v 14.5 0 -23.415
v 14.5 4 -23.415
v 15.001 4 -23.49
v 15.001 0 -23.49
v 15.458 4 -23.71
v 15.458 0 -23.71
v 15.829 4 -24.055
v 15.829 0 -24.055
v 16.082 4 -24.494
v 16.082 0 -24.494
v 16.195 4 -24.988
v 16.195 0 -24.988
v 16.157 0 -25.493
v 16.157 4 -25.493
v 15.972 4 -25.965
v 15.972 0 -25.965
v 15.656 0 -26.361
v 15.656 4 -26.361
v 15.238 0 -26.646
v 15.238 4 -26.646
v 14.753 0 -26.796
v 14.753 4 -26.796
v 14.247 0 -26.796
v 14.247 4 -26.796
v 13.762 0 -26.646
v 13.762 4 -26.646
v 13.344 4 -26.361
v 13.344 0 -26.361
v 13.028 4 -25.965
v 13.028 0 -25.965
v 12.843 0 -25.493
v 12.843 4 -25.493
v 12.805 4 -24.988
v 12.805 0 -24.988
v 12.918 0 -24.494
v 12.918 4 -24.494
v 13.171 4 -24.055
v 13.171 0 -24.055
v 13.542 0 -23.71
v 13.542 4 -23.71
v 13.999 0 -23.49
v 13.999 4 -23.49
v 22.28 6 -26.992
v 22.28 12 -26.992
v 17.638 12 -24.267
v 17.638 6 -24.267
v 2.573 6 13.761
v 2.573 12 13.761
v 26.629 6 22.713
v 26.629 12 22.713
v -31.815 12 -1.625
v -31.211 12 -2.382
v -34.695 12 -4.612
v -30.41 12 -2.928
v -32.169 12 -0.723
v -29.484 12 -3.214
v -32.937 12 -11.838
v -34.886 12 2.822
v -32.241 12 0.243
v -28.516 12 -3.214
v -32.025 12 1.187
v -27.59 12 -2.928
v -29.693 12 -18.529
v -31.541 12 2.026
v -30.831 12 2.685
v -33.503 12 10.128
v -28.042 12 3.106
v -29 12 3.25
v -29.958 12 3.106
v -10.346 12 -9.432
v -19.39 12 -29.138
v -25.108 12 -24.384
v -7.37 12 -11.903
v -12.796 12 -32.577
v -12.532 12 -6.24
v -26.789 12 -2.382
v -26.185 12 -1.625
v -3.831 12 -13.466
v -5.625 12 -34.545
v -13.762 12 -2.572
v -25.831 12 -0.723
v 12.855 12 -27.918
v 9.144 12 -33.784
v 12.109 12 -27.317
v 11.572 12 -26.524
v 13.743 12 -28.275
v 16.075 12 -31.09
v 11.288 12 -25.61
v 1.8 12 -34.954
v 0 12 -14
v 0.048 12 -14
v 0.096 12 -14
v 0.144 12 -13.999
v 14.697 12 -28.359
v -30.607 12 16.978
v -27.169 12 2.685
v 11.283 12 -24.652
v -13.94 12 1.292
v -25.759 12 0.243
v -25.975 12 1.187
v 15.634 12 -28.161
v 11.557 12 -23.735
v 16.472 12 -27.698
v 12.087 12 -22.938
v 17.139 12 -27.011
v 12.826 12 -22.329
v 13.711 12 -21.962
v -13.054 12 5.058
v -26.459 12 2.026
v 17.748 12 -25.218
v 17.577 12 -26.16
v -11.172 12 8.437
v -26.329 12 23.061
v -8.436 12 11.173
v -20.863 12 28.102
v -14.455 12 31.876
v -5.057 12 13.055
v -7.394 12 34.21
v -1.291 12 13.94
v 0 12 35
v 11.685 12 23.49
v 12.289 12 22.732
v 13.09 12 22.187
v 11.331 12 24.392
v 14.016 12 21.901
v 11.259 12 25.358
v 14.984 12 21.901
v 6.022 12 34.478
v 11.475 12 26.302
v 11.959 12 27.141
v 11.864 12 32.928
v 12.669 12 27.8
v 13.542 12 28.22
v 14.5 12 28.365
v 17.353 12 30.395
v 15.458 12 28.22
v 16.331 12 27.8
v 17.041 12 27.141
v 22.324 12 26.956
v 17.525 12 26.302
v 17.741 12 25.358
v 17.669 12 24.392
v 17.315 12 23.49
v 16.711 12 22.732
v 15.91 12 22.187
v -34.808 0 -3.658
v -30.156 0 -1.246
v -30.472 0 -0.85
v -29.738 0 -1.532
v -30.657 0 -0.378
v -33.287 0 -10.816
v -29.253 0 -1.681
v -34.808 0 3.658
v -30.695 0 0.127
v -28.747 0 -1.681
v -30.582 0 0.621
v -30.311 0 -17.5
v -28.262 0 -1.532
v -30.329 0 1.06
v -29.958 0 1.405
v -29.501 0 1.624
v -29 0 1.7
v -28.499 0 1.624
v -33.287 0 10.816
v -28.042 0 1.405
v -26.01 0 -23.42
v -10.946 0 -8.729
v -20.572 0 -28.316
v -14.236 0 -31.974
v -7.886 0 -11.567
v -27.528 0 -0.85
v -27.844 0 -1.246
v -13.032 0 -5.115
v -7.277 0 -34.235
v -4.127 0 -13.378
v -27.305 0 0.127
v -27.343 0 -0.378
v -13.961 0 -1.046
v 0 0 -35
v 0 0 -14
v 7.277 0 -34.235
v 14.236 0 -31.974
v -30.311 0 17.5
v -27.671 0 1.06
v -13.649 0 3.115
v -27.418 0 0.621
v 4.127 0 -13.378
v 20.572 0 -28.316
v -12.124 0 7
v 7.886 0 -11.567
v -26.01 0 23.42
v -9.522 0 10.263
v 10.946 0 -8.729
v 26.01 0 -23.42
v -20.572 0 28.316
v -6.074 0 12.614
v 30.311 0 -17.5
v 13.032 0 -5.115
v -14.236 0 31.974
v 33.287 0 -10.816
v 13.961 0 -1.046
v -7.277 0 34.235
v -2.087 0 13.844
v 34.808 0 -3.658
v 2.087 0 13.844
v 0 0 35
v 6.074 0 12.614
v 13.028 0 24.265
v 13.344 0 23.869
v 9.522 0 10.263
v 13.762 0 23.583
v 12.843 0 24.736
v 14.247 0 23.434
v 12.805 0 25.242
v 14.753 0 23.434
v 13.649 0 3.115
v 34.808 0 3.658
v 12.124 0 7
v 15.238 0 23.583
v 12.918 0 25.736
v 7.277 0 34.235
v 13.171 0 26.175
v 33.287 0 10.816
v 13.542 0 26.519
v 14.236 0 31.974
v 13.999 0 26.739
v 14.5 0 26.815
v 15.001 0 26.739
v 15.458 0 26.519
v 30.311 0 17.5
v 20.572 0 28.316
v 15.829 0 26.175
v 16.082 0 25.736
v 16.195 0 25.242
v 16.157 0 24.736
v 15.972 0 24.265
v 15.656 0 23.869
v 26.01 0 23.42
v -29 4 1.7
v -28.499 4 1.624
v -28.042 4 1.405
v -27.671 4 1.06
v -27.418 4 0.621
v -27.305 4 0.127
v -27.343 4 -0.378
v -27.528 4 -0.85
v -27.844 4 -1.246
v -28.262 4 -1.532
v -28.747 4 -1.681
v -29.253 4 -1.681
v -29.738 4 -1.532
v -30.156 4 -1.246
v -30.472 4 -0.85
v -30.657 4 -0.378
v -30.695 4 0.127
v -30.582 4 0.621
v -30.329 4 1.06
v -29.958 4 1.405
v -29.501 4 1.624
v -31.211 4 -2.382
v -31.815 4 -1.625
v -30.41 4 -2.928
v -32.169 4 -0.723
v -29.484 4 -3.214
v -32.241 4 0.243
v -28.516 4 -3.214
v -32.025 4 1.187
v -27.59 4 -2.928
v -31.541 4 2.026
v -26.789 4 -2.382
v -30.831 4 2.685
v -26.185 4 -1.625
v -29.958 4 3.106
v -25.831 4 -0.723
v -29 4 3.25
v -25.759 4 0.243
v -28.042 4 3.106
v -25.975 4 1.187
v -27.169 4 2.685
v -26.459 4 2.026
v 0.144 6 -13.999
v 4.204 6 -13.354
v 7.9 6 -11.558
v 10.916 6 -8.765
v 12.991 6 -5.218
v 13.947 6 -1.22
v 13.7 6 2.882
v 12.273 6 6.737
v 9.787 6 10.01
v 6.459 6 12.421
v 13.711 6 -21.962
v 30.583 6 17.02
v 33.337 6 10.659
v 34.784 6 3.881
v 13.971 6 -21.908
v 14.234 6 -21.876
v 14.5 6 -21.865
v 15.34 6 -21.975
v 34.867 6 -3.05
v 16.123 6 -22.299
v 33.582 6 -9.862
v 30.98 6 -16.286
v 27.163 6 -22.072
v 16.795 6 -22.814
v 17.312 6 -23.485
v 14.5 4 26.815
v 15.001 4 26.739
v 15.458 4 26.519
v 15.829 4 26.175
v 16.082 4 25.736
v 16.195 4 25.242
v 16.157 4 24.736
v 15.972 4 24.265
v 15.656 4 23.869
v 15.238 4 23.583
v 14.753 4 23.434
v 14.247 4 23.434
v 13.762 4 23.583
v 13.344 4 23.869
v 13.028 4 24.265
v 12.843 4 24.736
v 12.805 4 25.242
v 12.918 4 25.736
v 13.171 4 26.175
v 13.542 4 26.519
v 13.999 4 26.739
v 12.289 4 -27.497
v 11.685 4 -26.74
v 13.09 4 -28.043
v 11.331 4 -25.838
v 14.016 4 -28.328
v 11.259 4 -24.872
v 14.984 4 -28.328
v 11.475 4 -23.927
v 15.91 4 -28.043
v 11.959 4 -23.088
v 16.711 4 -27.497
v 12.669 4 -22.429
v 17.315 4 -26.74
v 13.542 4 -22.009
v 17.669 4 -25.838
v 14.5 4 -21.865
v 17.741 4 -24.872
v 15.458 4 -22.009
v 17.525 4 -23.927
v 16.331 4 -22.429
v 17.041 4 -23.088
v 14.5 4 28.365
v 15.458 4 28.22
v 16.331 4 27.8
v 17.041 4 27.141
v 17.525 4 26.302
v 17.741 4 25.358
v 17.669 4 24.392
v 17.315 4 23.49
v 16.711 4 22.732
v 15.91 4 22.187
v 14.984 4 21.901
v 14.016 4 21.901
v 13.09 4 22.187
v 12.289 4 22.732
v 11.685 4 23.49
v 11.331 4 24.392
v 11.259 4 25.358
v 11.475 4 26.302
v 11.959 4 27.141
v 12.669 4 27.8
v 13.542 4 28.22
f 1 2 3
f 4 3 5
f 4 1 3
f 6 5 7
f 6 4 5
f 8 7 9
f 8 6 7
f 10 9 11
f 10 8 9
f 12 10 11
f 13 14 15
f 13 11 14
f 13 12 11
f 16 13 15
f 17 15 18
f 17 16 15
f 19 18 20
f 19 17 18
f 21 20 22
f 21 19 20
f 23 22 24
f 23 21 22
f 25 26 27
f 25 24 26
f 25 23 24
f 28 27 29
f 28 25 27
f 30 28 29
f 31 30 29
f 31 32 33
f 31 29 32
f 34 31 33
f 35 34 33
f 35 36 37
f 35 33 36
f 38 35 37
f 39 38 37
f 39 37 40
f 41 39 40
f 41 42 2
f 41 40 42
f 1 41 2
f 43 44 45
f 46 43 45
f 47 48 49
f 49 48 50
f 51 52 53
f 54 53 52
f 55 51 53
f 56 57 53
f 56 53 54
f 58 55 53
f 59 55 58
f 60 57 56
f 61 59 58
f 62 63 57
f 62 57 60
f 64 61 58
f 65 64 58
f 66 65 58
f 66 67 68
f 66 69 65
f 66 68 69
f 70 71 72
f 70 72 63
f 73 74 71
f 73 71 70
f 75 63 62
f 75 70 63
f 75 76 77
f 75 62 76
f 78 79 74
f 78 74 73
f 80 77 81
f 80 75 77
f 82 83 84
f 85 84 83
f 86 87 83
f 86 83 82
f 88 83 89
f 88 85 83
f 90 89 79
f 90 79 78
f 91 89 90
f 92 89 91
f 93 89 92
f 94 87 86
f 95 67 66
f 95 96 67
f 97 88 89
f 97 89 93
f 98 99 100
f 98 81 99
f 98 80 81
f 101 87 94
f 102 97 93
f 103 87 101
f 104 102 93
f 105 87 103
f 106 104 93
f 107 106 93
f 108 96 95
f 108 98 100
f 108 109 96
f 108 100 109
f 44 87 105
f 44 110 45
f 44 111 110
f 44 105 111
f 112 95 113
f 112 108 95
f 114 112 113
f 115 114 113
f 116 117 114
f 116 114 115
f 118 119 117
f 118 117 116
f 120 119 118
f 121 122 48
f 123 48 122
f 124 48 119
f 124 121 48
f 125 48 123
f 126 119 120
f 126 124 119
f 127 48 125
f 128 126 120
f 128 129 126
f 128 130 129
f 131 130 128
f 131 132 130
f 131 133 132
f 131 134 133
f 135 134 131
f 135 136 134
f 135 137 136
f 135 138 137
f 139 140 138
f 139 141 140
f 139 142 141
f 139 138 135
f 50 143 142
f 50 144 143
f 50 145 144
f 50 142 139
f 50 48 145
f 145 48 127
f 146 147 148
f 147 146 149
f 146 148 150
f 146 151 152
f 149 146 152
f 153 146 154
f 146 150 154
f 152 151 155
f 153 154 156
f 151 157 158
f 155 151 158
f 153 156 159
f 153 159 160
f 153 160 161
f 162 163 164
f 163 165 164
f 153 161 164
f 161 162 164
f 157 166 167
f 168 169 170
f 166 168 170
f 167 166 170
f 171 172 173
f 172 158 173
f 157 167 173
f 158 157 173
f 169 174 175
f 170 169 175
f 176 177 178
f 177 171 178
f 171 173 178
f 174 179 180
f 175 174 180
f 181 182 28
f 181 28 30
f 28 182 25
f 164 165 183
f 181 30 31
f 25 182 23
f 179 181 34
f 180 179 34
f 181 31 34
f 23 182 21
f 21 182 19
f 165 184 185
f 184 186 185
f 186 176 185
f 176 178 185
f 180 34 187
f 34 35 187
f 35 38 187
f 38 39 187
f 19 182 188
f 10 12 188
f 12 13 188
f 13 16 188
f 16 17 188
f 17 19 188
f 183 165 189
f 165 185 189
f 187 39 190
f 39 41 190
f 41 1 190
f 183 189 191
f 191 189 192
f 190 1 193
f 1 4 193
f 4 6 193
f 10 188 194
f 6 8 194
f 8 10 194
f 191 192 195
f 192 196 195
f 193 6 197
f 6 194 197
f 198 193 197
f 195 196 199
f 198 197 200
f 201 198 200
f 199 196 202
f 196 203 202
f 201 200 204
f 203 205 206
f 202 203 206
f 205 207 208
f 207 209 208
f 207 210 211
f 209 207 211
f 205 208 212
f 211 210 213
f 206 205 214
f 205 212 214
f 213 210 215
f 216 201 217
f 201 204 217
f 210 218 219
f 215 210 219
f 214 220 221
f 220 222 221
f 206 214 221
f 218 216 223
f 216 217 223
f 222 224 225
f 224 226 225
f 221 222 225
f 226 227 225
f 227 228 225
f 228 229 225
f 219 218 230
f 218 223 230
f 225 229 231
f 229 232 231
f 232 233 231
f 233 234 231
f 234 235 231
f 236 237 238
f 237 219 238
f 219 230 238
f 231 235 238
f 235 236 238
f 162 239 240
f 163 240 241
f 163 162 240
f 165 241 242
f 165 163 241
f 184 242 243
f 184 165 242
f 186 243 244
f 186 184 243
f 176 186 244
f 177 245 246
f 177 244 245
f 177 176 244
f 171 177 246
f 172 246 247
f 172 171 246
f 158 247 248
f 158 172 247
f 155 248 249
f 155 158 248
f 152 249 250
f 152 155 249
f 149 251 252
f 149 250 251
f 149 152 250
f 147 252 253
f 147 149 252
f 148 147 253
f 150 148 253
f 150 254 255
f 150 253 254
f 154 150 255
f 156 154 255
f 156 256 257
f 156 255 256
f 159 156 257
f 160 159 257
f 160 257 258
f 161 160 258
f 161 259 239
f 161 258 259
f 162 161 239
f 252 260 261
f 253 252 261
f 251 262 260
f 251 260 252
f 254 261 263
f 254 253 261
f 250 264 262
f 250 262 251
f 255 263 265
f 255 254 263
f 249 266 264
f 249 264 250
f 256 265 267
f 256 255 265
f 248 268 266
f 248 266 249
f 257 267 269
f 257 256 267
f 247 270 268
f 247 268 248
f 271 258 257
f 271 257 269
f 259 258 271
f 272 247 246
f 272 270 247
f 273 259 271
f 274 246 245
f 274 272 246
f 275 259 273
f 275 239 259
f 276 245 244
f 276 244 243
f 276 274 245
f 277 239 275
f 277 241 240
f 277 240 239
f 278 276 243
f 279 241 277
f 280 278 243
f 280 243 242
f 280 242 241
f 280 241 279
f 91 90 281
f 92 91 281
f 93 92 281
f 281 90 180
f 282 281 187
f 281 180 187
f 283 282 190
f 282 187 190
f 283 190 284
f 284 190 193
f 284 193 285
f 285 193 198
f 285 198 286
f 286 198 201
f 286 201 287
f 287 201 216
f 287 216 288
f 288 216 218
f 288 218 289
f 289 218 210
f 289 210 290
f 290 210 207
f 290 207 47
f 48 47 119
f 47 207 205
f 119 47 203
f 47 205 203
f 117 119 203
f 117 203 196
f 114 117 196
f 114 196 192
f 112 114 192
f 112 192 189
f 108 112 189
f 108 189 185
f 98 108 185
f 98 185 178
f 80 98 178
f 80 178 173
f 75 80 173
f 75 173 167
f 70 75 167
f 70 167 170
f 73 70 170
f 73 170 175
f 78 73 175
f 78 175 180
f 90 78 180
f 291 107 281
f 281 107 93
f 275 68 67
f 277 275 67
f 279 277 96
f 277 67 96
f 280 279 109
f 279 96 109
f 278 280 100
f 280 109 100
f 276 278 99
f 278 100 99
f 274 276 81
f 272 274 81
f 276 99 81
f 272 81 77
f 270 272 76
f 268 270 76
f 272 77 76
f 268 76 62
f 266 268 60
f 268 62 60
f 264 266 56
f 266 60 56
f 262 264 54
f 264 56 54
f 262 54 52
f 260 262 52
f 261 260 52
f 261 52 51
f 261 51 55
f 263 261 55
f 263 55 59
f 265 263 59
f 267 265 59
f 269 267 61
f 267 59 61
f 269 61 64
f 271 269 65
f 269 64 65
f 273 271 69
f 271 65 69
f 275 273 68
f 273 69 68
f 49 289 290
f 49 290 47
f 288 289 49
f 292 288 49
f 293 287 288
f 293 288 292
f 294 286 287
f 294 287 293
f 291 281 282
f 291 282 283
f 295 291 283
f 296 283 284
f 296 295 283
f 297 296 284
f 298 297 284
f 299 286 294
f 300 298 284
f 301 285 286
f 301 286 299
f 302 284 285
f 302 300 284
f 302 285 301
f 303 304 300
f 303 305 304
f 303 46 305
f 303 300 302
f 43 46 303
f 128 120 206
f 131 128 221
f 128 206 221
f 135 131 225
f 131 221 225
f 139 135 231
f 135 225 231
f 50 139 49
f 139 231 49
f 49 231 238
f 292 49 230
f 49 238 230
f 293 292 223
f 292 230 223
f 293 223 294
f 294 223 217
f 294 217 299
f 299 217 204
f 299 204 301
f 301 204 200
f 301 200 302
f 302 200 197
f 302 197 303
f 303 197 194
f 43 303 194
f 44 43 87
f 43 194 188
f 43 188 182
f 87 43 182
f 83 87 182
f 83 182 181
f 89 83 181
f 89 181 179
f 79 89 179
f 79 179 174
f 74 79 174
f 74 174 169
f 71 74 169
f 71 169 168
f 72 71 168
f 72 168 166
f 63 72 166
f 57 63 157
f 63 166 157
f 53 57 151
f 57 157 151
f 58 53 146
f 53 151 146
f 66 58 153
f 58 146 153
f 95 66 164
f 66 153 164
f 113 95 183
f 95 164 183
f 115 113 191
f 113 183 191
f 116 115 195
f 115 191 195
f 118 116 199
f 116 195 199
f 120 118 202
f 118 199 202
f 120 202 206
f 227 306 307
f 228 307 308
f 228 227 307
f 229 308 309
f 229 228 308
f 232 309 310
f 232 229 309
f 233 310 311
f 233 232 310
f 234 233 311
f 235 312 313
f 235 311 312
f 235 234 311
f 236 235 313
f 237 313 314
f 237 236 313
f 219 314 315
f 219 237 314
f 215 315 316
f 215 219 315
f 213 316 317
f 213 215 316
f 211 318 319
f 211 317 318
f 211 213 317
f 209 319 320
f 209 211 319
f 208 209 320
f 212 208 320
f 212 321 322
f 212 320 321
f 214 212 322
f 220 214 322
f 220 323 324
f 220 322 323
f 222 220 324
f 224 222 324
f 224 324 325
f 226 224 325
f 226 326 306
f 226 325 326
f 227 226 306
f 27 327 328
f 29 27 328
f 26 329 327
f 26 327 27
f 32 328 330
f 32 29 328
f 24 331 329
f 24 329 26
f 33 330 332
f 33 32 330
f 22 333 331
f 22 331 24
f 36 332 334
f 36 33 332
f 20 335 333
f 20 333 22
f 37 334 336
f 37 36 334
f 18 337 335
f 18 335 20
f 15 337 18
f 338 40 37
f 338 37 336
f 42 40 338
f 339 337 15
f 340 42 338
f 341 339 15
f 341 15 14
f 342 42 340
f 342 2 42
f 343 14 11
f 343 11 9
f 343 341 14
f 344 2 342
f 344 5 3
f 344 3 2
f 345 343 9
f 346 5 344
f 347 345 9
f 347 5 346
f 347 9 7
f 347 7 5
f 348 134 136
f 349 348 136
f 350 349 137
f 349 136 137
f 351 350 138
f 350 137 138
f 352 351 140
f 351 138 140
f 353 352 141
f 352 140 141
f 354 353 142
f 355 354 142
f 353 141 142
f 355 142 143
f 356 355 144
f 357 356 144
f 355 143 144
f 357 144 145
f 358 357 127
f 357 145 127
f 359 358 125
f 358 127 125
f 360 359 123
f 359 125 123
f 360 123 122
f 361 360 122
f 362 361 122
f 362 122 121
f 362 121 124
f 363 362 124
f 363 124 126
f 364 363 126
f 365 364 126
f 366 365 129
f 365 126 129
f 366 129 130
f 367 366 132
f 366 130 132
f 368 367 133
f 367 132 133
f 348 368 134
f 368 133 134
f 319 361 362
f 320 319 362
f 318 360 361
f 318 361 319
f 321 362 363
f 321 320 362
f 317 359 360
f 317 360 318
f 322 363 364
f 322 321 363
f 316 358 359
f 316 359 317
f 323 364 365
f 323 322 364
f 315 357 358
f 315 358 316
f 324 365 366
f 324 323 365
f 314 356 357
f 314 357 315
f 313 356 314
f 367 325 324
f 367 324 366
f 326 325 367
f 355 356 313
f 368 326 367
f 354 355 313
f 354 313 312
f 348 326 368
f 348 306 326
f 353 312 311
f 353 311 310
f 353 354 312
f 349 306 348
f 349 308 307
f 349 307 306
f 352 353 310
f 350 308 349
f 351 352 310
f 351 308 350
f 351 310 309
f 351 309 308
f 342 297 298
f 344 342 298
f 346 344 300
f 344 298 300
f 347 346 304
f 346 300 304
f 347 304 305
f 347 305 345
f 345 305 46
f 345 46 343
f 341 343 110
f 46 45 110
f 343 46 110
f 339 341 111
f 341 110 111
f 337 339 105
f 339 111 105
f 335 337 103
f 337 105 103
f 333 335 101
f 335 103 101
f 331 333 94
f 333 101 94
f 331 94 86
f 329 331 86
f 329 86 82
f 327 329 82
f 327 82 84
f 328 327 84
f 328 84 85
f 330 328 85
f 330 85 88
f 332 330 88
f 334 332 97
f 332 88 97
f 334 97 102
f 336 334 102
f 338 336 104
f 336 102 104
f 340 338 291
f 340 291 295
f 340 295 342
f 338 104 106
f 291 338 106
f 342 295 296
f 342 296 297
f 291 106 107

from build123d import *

# Parameters (mm, degrees)
SKETCH_1_R          = 35
SKETCH_1_R_2        = 1.7
EXTRUDE_1_DEPTH     = 12
CUT_EXTRUDE_1_DEPTH = 6
SKETCH_4_R          = 14
CUT_EXTRUDE_3_DEPTH = 51.931326313
SKETCH_5_R          = 3.25
CUT_EXTRUDE_4_DEPTH = 8


with BuildPart() as part:
    # 草图1 → 凸台-拉伸1 (new body)
    with BuildSketch(Plane(origin=(0, 0, 0), x_dir=(1, 0, 0), z_dir=(0, 1, 0))):
        with Locations(Location((0, 0, 0), (0, 0, 270))):
            Circle(SKETCH_1_R)
        with Locations(Location((14.5, 25.11473671, 0), (0, 0, 270))):
            Circle(SKETCH_1_R_2, mode=Mode.SUBTRACT)
        with Locations(Location((14.5, -25.11473671, 0), (0, 0, 270))):
            Circle(SKETCH_1_R_2, mode=Mode.SUBTRACT)
        with Locations(Location((-29, 0, 0), (0, 0, 270))):
            Circle(SKETCH_1_R_2, mode=Mode.SUBTRACT)
    extrude(amount=EXTRUDE_1_DEPTH)

    # 草图2 → 切除-拉伸1 (cut)
    with BuildSketch(Plane(origin=(0, 12, 0), x_dir=(1, 0, 0), z_dir=(0, 1, 0))):
        with BuildLine():
            Line((35.785871092, 34.919499283), (-6.074470585, 10.348951981))
            ThreePointArc((-6.074470585, 10.348951981), (-11.954336377, -1.045868913), (-4.185109075, -11.246548894))
            Line((-4.185109075, -11.246548894), (41.305910715, -28.174842324))
            ThreePointArc((41.305910715, -28.174842324), (49.809734905, 4.357787137), (35.785871092, 34.919499283))
        make_face()
    extrude(amount=-CUT_EXTRUDE_1_DEPTH, mode=Mode.SUBTRACT)

    # 草图4 → 切除-拉伸3 (cut, through all)
    with BuildSketch(Plane.XZ):
        with Locations(Location((0, 0, 0), (0, 0, 270))):
            Circle(SKETCH_4_R)
    extrude(amount=-CUT_EXTRUDE_3_DEPTH, mode=Mode.SUBTRACT)

    # 草图5 → 切除-拉伸4 (cut)
    with BuildSketch(Plane(origin=(0, 12, 0), x_dir=(1, 0, 0), z_dir=(0, 1, 0))):
        with Locations(Location((14.5, 25.11473671, 0), (0, 0, 270))):
            Circle(SKETCH_5_R)
        with Locations(Location((14.5, -25.11473671, 0), (0, 0, 270))):
            Circle(SKETCH_5_R)
        with Locations(Location((-29, 0, 0), (0, 0, 270))):
            Circle(SKETCH_5_R)
    extrude(amount=-CUT_EXTRUDE_4_DEPTH, mode=Mode.SUBTRACT)


solid = part.part
